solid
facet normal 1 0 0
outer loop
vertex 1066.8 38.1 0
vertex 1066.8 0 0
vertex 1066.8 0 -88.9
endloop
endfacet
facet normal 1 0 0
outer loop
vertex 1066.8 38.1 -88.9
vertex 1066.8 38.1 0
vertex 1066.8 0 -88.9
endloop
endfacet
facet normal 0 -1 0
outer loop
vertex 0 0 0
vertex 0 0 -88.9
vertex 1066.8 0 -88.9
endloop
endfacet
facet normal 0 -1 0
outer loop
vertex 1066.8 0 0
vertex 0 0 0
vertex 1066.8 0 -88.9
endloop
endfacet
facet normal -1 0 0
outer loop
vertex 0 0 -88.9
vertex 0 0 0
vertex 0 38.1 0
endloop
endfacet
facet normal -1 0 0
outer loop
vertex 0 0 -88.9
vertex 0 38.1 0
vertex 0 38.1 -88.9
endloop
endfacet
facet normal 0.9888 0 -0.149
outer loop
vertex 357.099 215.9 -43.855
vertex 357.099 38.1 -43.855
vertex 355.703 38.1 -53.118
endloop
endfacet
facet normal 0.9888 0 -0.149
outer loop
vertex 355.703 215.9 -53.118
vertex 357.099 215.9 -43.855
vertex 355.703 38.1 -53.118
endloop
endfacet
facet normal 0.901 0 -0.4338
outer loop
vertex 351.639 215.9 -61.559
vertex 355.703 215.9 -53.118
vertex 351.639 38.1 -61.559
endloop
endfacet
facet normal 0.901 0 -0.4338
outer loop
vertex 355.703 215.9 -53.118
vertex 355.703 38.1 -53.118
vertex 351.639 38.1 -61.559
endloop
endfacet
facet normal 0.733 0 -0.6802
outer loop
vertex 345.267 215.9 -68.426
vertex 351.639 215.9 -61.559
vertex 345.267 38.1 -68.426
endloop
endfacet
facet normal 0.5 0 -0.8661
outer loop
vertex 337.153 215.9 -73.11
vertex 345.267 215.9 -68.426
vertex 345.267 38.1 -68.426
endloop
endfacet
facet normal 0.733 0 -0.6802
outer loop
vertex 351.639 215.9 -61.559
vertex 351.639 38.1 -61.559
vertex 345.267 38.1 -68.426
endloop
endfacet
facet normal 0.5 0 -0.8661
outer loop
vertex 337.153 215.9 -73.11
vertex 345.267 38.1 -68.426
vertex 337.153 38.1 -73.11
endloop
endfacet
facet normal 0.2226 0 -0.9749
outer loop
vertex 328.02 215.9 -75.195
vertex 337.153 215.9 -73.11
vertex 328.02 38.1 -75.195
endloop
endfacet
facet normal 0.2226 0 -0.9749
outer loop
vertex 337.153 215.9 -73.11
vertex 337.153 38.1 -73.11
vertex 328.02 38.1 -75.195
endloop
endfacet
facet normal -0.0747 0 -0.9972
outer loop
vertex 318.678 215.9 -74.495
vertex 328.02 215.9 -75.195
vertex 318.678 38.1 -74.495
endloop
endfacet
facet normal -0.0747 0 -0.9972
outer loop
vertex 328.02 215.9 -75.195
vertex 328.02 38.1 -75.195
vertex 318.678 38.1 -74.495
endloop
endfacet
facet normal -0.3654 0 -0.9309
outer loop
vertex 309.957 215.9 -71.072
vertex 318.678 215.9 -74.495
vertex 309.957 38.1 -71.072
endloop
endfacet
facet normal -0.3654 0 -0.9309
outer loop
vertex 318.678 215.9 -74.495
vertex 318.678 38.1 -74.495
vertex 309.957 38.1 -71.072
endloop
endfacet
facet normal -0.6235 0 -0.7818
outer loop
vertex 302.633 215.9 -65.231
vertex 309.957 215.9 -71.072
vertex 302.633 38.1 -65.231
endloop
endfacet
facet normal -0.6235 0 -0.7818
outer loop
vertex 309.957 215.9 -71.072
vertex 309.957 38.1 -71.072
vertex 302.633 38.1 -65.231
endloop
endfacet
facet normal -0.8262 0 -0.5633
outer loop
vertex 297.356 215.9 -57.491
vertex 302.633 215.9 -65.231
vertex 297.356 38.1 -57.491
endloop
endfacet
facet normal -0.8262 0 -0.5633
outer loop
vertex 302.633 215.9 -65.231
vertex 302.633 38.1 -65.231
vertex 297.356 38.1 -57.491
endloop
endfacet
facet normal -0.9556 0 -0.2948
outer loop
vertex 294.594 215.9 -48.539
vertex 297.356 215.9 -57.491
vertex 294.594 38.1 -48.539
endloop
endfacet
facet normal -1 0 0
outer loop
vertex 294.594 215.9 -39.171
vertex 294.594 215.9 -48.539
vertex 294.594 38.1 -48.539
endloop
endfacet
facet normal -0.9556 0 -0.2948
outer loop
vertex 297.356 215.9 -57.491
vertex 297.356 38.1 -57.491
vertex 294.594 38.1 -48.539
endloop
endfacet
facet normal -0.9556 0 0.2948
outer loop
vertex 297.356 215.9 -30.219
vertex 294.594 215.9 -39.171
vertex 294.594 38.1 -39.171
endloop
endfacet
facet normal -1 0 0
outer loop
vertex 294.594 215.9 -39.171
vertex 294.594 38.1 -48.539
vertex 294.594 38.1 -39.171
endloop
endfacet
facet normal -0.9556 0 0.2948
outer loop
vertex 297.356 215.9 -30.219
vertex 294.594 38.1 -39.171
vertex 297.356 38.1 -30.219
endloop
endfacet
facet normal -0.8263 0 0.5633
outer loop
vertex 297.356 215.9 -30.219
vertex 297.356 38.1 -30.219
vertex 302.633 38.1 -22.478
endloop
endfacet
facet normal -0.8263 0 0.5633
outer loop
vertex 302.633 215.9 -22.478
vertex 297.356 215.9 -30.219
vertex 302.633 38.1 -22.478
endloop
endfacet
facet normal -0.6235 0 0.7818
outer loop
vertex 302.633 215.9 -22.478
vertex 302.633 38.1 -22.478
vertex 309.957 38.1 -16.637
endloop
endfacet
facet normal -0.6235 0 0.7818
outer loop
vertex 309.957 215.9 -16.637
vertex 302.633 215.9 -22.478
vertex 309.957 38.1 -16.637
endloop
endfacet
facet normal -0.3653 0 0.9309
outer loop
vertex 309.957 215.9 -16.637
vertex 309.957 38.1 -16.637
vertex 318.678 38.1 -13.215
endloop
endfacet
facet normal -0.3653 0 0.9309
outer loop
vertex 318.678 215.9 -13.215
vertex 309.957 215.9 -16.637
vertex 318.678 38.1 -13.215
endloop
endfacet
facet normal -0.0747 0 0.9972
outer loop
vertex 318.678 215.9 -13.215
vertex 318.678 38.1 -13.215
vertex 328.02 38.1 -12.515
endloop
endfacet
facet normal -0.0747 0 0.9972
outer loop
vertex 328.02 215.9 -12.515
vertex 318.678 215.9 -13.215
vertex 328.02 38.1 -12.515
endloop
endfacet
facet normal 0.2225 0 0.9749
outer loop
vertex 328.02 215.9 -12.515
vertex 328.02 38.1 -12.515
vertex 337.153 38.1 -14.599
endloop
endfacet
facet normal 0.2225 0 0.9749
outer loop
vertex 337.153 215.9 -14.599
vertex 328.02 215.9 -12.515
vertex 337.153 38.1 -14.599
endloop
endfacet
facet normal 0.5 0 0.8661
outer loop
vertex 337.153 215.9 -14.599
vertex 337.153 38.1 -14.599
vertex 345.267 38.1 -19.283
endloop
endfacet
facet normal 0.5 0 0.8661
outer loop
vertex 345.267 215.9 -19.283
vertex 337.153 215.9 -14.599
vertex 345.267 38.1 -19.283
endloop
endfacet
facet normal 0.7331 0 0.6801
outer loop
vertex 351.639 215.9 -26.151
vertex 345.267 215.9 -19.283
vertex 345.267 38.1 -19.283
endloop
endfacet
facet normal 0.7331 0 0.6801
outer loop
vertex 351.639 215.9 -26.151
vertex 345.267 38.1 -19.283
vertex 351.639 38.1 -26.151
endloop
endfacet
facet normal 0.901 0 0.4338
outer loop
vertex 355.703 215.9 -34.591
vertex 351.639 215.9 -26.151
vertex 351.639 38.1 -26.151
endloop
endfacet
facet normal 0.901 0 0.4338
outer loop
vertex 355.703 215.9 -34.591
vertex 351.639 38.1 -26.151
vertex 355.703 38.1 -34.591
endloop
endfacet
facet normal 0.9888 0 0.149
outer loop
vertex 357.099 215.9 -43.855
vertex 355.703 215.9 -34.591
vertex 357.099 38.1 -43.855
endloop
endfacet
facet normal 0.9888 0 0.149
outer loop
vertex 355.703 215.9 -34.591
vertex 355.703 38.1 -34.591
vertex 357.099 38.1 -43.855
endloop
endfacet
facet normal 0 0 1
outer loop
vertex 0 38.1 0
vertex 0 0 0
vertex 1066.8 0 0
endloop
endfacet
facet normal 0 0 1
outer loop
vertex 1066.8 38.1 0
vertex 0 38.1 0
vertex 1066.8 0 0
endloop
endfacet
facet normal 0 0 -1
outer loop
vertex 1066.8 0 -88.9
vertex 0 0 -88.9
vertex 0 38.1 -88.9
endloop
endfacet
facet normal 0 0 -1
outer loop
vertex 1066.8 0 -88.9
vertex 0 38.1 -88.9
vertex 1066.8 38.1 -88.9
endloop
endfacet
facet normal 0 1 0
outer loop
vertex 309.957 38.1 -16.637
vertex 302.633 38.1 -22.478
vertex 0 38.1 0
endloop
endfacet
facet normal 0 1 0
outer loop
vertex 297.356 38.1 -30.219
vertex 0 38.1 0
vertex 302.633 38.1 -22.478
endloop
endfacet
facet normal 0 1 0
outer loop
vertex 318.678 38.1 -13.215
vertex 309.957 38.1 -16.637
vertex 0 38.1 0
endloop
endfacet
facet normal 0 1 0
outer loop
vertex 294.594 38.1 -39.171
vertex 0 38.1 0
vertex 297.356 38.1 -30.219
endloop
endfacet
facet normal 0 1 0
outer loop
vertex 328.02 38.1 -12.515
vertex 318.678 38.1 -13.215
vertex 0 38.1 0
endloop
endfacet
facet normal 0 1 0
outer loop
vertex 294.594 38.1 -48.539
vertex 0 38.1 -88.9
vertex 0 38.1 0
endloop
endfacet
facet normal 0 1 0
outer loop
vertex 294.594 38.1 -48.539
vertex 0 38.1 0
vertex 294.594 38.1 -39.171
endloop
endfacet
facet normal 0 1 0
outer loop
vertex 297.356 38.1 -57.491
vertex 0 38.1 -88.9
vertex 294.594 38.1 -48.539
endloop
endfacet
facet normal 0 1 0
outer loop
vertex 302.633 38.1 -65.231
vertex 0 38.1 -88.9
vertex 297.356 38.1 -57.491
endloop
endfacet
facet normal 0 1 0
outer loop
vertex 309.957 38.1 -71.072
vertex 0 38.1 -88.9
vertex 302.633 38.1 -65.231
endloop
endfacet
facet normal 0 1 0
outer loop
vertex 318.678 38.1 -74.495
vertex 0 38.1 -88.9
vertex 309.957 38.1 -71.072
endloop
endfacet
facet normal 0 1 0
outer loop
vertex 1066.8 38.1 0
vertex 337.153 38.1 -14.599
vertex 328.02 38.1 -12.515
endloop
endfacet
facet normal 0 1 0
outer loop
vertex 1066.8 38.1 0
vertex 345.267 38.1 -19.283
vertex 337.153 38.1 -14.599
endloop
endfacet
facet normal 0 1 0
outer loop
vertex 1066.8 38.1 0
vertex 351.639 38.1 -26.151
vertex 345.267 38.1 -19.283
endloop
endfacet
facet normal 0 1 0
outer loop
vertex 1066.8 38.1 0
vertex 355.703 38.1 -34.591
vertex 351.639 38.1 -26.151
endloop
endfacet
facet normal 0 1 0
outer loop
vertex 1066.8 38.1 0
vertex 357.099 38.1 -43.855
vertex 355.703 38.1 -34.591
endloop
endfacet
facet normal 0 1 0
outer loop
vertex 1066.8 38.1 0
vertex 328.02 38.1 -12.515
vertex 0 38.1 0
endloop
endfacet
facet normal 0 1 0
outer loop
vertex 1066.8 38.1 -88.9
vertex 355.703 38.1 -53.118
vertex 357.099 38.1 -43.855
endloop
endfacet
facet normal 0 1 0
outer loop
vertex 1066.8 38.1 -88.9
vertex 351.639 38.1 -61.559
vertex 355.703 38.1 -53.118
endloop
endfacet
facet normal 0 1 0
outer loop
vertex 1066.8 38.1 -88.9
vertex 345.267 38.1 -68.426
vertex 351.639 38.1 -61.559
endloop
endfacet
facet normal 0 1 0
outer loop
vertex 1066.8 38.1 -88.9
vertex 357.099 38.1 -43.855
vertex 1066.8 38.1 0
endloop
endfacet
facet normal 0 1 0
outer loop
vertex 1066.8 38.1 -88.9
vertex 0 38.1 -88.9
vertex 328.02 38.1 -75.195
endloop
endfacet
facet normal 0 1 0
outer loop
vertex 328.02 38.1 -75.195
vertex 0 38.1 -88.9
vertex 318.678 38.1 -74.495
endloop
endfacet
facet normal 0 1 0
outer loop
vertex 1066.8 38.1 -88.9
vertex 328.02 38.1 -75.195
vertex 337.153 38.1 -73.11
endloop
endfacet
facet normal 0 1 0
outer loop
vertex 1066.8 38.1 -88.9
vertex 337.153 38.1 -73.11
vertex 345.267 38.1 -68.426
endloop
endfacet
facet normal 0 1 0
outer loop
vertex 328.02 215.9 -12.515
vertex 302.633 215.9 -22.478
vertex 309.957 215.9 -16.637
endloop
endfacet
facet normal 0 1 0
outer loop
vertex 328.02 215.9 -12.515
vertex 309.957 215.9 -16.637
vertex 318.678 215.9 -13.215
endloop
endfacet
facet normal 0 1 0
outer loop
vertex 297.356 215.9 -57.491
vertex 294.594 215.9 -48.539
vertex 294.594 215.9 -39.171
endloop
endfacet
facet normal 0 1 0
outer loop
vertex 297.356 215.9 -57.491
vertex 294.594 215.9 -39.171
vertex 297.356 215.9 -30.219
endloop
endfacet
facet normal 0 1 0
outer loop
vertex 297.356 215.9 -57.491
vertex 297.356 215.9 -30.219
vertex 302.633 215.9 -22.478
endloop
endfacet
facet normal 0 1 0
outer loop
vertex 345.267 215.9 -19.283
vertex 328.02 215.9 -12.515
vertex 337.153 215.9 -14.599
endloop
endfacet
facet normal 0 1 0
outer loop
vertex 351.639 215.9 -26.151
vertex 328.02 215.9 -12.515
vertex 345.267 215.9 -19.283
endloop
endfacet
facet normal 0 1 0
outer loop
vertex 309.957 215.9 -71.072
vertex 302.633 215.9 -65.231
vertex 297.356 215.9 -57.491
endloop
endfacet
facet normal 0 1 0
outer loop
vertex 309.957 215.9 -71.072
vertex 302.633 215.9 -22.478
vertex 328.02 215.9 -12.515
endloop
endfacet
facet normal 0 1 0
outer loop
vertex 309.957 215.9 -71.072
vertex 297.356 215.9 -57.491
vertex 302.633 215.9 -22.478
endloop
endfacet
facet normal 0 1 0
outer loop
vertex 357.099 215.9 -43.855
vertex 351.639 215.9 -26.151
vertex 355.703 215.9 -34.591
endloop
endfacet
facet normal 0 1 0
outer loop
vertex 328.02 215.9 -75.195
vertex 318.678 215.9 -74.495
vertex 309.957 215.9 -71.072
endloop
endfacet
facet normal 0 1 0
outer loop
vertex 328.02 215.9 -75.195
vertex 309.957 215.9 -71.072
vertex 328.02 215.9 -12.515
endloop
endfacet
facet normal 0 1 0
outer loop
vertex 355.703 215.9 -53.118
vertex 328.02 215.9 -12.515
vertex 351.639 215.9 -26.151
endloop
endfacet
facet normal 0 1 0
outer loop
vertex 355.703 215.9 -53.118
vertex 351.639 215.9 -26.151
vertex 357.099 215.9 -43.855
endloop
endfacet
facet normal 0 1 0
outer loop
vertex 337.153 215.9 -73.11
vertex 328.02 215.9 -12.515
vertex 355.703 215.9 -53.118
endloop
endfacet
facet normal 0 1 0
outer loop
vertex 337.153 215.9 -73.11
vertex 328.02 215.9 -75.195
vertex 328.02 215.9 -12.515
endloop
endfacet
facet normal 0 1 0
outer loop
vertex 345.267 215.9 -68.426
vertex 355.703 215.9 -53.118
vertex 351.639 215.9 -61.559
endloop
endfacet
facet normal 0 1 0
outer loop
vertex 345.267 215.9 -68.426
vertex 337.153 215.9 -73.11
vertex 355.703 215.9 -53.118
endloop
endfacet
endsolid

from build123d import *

# Parameters (mm, degrees)
SKETCH1_W           = 1066.8
SKETCH1_H           = 88.9
BOSS_EXTRUDE1_DEPTH = 38.1
SKETCH2_R           = 31.428028039
BOSS_EXTRUDE2_DEPTH = 177.8


with BuildPart() as part:
    # Sketch1 → Boss-Extrude1 (new body)
    with BuildSketch(Plane(origin=(0, 0, 0), x_dir=(1, 0, 0), z_dir=(0, 1, 0))):
        with Locations((533.4, 44.45)):
            Rectangle(SKETCH1_W, SKETCH1_H)
    extrude(amount=BOSS_EXTRUDE1_DEPTH)

    # Sketch2 → Boss-Extrude2 (add)
    with BuildSketch(Plane(origin=(0, 38.1, 0), x_dir=(1, 0, 0), z_dir=(0, 1, 0))):
        with Locations((325.671457389, 43.854789276)):
            Circle(SKETCH2_R)
    extrude(amount=BOSS_EXTRUDE2_DEPTH)


solid = part.part
